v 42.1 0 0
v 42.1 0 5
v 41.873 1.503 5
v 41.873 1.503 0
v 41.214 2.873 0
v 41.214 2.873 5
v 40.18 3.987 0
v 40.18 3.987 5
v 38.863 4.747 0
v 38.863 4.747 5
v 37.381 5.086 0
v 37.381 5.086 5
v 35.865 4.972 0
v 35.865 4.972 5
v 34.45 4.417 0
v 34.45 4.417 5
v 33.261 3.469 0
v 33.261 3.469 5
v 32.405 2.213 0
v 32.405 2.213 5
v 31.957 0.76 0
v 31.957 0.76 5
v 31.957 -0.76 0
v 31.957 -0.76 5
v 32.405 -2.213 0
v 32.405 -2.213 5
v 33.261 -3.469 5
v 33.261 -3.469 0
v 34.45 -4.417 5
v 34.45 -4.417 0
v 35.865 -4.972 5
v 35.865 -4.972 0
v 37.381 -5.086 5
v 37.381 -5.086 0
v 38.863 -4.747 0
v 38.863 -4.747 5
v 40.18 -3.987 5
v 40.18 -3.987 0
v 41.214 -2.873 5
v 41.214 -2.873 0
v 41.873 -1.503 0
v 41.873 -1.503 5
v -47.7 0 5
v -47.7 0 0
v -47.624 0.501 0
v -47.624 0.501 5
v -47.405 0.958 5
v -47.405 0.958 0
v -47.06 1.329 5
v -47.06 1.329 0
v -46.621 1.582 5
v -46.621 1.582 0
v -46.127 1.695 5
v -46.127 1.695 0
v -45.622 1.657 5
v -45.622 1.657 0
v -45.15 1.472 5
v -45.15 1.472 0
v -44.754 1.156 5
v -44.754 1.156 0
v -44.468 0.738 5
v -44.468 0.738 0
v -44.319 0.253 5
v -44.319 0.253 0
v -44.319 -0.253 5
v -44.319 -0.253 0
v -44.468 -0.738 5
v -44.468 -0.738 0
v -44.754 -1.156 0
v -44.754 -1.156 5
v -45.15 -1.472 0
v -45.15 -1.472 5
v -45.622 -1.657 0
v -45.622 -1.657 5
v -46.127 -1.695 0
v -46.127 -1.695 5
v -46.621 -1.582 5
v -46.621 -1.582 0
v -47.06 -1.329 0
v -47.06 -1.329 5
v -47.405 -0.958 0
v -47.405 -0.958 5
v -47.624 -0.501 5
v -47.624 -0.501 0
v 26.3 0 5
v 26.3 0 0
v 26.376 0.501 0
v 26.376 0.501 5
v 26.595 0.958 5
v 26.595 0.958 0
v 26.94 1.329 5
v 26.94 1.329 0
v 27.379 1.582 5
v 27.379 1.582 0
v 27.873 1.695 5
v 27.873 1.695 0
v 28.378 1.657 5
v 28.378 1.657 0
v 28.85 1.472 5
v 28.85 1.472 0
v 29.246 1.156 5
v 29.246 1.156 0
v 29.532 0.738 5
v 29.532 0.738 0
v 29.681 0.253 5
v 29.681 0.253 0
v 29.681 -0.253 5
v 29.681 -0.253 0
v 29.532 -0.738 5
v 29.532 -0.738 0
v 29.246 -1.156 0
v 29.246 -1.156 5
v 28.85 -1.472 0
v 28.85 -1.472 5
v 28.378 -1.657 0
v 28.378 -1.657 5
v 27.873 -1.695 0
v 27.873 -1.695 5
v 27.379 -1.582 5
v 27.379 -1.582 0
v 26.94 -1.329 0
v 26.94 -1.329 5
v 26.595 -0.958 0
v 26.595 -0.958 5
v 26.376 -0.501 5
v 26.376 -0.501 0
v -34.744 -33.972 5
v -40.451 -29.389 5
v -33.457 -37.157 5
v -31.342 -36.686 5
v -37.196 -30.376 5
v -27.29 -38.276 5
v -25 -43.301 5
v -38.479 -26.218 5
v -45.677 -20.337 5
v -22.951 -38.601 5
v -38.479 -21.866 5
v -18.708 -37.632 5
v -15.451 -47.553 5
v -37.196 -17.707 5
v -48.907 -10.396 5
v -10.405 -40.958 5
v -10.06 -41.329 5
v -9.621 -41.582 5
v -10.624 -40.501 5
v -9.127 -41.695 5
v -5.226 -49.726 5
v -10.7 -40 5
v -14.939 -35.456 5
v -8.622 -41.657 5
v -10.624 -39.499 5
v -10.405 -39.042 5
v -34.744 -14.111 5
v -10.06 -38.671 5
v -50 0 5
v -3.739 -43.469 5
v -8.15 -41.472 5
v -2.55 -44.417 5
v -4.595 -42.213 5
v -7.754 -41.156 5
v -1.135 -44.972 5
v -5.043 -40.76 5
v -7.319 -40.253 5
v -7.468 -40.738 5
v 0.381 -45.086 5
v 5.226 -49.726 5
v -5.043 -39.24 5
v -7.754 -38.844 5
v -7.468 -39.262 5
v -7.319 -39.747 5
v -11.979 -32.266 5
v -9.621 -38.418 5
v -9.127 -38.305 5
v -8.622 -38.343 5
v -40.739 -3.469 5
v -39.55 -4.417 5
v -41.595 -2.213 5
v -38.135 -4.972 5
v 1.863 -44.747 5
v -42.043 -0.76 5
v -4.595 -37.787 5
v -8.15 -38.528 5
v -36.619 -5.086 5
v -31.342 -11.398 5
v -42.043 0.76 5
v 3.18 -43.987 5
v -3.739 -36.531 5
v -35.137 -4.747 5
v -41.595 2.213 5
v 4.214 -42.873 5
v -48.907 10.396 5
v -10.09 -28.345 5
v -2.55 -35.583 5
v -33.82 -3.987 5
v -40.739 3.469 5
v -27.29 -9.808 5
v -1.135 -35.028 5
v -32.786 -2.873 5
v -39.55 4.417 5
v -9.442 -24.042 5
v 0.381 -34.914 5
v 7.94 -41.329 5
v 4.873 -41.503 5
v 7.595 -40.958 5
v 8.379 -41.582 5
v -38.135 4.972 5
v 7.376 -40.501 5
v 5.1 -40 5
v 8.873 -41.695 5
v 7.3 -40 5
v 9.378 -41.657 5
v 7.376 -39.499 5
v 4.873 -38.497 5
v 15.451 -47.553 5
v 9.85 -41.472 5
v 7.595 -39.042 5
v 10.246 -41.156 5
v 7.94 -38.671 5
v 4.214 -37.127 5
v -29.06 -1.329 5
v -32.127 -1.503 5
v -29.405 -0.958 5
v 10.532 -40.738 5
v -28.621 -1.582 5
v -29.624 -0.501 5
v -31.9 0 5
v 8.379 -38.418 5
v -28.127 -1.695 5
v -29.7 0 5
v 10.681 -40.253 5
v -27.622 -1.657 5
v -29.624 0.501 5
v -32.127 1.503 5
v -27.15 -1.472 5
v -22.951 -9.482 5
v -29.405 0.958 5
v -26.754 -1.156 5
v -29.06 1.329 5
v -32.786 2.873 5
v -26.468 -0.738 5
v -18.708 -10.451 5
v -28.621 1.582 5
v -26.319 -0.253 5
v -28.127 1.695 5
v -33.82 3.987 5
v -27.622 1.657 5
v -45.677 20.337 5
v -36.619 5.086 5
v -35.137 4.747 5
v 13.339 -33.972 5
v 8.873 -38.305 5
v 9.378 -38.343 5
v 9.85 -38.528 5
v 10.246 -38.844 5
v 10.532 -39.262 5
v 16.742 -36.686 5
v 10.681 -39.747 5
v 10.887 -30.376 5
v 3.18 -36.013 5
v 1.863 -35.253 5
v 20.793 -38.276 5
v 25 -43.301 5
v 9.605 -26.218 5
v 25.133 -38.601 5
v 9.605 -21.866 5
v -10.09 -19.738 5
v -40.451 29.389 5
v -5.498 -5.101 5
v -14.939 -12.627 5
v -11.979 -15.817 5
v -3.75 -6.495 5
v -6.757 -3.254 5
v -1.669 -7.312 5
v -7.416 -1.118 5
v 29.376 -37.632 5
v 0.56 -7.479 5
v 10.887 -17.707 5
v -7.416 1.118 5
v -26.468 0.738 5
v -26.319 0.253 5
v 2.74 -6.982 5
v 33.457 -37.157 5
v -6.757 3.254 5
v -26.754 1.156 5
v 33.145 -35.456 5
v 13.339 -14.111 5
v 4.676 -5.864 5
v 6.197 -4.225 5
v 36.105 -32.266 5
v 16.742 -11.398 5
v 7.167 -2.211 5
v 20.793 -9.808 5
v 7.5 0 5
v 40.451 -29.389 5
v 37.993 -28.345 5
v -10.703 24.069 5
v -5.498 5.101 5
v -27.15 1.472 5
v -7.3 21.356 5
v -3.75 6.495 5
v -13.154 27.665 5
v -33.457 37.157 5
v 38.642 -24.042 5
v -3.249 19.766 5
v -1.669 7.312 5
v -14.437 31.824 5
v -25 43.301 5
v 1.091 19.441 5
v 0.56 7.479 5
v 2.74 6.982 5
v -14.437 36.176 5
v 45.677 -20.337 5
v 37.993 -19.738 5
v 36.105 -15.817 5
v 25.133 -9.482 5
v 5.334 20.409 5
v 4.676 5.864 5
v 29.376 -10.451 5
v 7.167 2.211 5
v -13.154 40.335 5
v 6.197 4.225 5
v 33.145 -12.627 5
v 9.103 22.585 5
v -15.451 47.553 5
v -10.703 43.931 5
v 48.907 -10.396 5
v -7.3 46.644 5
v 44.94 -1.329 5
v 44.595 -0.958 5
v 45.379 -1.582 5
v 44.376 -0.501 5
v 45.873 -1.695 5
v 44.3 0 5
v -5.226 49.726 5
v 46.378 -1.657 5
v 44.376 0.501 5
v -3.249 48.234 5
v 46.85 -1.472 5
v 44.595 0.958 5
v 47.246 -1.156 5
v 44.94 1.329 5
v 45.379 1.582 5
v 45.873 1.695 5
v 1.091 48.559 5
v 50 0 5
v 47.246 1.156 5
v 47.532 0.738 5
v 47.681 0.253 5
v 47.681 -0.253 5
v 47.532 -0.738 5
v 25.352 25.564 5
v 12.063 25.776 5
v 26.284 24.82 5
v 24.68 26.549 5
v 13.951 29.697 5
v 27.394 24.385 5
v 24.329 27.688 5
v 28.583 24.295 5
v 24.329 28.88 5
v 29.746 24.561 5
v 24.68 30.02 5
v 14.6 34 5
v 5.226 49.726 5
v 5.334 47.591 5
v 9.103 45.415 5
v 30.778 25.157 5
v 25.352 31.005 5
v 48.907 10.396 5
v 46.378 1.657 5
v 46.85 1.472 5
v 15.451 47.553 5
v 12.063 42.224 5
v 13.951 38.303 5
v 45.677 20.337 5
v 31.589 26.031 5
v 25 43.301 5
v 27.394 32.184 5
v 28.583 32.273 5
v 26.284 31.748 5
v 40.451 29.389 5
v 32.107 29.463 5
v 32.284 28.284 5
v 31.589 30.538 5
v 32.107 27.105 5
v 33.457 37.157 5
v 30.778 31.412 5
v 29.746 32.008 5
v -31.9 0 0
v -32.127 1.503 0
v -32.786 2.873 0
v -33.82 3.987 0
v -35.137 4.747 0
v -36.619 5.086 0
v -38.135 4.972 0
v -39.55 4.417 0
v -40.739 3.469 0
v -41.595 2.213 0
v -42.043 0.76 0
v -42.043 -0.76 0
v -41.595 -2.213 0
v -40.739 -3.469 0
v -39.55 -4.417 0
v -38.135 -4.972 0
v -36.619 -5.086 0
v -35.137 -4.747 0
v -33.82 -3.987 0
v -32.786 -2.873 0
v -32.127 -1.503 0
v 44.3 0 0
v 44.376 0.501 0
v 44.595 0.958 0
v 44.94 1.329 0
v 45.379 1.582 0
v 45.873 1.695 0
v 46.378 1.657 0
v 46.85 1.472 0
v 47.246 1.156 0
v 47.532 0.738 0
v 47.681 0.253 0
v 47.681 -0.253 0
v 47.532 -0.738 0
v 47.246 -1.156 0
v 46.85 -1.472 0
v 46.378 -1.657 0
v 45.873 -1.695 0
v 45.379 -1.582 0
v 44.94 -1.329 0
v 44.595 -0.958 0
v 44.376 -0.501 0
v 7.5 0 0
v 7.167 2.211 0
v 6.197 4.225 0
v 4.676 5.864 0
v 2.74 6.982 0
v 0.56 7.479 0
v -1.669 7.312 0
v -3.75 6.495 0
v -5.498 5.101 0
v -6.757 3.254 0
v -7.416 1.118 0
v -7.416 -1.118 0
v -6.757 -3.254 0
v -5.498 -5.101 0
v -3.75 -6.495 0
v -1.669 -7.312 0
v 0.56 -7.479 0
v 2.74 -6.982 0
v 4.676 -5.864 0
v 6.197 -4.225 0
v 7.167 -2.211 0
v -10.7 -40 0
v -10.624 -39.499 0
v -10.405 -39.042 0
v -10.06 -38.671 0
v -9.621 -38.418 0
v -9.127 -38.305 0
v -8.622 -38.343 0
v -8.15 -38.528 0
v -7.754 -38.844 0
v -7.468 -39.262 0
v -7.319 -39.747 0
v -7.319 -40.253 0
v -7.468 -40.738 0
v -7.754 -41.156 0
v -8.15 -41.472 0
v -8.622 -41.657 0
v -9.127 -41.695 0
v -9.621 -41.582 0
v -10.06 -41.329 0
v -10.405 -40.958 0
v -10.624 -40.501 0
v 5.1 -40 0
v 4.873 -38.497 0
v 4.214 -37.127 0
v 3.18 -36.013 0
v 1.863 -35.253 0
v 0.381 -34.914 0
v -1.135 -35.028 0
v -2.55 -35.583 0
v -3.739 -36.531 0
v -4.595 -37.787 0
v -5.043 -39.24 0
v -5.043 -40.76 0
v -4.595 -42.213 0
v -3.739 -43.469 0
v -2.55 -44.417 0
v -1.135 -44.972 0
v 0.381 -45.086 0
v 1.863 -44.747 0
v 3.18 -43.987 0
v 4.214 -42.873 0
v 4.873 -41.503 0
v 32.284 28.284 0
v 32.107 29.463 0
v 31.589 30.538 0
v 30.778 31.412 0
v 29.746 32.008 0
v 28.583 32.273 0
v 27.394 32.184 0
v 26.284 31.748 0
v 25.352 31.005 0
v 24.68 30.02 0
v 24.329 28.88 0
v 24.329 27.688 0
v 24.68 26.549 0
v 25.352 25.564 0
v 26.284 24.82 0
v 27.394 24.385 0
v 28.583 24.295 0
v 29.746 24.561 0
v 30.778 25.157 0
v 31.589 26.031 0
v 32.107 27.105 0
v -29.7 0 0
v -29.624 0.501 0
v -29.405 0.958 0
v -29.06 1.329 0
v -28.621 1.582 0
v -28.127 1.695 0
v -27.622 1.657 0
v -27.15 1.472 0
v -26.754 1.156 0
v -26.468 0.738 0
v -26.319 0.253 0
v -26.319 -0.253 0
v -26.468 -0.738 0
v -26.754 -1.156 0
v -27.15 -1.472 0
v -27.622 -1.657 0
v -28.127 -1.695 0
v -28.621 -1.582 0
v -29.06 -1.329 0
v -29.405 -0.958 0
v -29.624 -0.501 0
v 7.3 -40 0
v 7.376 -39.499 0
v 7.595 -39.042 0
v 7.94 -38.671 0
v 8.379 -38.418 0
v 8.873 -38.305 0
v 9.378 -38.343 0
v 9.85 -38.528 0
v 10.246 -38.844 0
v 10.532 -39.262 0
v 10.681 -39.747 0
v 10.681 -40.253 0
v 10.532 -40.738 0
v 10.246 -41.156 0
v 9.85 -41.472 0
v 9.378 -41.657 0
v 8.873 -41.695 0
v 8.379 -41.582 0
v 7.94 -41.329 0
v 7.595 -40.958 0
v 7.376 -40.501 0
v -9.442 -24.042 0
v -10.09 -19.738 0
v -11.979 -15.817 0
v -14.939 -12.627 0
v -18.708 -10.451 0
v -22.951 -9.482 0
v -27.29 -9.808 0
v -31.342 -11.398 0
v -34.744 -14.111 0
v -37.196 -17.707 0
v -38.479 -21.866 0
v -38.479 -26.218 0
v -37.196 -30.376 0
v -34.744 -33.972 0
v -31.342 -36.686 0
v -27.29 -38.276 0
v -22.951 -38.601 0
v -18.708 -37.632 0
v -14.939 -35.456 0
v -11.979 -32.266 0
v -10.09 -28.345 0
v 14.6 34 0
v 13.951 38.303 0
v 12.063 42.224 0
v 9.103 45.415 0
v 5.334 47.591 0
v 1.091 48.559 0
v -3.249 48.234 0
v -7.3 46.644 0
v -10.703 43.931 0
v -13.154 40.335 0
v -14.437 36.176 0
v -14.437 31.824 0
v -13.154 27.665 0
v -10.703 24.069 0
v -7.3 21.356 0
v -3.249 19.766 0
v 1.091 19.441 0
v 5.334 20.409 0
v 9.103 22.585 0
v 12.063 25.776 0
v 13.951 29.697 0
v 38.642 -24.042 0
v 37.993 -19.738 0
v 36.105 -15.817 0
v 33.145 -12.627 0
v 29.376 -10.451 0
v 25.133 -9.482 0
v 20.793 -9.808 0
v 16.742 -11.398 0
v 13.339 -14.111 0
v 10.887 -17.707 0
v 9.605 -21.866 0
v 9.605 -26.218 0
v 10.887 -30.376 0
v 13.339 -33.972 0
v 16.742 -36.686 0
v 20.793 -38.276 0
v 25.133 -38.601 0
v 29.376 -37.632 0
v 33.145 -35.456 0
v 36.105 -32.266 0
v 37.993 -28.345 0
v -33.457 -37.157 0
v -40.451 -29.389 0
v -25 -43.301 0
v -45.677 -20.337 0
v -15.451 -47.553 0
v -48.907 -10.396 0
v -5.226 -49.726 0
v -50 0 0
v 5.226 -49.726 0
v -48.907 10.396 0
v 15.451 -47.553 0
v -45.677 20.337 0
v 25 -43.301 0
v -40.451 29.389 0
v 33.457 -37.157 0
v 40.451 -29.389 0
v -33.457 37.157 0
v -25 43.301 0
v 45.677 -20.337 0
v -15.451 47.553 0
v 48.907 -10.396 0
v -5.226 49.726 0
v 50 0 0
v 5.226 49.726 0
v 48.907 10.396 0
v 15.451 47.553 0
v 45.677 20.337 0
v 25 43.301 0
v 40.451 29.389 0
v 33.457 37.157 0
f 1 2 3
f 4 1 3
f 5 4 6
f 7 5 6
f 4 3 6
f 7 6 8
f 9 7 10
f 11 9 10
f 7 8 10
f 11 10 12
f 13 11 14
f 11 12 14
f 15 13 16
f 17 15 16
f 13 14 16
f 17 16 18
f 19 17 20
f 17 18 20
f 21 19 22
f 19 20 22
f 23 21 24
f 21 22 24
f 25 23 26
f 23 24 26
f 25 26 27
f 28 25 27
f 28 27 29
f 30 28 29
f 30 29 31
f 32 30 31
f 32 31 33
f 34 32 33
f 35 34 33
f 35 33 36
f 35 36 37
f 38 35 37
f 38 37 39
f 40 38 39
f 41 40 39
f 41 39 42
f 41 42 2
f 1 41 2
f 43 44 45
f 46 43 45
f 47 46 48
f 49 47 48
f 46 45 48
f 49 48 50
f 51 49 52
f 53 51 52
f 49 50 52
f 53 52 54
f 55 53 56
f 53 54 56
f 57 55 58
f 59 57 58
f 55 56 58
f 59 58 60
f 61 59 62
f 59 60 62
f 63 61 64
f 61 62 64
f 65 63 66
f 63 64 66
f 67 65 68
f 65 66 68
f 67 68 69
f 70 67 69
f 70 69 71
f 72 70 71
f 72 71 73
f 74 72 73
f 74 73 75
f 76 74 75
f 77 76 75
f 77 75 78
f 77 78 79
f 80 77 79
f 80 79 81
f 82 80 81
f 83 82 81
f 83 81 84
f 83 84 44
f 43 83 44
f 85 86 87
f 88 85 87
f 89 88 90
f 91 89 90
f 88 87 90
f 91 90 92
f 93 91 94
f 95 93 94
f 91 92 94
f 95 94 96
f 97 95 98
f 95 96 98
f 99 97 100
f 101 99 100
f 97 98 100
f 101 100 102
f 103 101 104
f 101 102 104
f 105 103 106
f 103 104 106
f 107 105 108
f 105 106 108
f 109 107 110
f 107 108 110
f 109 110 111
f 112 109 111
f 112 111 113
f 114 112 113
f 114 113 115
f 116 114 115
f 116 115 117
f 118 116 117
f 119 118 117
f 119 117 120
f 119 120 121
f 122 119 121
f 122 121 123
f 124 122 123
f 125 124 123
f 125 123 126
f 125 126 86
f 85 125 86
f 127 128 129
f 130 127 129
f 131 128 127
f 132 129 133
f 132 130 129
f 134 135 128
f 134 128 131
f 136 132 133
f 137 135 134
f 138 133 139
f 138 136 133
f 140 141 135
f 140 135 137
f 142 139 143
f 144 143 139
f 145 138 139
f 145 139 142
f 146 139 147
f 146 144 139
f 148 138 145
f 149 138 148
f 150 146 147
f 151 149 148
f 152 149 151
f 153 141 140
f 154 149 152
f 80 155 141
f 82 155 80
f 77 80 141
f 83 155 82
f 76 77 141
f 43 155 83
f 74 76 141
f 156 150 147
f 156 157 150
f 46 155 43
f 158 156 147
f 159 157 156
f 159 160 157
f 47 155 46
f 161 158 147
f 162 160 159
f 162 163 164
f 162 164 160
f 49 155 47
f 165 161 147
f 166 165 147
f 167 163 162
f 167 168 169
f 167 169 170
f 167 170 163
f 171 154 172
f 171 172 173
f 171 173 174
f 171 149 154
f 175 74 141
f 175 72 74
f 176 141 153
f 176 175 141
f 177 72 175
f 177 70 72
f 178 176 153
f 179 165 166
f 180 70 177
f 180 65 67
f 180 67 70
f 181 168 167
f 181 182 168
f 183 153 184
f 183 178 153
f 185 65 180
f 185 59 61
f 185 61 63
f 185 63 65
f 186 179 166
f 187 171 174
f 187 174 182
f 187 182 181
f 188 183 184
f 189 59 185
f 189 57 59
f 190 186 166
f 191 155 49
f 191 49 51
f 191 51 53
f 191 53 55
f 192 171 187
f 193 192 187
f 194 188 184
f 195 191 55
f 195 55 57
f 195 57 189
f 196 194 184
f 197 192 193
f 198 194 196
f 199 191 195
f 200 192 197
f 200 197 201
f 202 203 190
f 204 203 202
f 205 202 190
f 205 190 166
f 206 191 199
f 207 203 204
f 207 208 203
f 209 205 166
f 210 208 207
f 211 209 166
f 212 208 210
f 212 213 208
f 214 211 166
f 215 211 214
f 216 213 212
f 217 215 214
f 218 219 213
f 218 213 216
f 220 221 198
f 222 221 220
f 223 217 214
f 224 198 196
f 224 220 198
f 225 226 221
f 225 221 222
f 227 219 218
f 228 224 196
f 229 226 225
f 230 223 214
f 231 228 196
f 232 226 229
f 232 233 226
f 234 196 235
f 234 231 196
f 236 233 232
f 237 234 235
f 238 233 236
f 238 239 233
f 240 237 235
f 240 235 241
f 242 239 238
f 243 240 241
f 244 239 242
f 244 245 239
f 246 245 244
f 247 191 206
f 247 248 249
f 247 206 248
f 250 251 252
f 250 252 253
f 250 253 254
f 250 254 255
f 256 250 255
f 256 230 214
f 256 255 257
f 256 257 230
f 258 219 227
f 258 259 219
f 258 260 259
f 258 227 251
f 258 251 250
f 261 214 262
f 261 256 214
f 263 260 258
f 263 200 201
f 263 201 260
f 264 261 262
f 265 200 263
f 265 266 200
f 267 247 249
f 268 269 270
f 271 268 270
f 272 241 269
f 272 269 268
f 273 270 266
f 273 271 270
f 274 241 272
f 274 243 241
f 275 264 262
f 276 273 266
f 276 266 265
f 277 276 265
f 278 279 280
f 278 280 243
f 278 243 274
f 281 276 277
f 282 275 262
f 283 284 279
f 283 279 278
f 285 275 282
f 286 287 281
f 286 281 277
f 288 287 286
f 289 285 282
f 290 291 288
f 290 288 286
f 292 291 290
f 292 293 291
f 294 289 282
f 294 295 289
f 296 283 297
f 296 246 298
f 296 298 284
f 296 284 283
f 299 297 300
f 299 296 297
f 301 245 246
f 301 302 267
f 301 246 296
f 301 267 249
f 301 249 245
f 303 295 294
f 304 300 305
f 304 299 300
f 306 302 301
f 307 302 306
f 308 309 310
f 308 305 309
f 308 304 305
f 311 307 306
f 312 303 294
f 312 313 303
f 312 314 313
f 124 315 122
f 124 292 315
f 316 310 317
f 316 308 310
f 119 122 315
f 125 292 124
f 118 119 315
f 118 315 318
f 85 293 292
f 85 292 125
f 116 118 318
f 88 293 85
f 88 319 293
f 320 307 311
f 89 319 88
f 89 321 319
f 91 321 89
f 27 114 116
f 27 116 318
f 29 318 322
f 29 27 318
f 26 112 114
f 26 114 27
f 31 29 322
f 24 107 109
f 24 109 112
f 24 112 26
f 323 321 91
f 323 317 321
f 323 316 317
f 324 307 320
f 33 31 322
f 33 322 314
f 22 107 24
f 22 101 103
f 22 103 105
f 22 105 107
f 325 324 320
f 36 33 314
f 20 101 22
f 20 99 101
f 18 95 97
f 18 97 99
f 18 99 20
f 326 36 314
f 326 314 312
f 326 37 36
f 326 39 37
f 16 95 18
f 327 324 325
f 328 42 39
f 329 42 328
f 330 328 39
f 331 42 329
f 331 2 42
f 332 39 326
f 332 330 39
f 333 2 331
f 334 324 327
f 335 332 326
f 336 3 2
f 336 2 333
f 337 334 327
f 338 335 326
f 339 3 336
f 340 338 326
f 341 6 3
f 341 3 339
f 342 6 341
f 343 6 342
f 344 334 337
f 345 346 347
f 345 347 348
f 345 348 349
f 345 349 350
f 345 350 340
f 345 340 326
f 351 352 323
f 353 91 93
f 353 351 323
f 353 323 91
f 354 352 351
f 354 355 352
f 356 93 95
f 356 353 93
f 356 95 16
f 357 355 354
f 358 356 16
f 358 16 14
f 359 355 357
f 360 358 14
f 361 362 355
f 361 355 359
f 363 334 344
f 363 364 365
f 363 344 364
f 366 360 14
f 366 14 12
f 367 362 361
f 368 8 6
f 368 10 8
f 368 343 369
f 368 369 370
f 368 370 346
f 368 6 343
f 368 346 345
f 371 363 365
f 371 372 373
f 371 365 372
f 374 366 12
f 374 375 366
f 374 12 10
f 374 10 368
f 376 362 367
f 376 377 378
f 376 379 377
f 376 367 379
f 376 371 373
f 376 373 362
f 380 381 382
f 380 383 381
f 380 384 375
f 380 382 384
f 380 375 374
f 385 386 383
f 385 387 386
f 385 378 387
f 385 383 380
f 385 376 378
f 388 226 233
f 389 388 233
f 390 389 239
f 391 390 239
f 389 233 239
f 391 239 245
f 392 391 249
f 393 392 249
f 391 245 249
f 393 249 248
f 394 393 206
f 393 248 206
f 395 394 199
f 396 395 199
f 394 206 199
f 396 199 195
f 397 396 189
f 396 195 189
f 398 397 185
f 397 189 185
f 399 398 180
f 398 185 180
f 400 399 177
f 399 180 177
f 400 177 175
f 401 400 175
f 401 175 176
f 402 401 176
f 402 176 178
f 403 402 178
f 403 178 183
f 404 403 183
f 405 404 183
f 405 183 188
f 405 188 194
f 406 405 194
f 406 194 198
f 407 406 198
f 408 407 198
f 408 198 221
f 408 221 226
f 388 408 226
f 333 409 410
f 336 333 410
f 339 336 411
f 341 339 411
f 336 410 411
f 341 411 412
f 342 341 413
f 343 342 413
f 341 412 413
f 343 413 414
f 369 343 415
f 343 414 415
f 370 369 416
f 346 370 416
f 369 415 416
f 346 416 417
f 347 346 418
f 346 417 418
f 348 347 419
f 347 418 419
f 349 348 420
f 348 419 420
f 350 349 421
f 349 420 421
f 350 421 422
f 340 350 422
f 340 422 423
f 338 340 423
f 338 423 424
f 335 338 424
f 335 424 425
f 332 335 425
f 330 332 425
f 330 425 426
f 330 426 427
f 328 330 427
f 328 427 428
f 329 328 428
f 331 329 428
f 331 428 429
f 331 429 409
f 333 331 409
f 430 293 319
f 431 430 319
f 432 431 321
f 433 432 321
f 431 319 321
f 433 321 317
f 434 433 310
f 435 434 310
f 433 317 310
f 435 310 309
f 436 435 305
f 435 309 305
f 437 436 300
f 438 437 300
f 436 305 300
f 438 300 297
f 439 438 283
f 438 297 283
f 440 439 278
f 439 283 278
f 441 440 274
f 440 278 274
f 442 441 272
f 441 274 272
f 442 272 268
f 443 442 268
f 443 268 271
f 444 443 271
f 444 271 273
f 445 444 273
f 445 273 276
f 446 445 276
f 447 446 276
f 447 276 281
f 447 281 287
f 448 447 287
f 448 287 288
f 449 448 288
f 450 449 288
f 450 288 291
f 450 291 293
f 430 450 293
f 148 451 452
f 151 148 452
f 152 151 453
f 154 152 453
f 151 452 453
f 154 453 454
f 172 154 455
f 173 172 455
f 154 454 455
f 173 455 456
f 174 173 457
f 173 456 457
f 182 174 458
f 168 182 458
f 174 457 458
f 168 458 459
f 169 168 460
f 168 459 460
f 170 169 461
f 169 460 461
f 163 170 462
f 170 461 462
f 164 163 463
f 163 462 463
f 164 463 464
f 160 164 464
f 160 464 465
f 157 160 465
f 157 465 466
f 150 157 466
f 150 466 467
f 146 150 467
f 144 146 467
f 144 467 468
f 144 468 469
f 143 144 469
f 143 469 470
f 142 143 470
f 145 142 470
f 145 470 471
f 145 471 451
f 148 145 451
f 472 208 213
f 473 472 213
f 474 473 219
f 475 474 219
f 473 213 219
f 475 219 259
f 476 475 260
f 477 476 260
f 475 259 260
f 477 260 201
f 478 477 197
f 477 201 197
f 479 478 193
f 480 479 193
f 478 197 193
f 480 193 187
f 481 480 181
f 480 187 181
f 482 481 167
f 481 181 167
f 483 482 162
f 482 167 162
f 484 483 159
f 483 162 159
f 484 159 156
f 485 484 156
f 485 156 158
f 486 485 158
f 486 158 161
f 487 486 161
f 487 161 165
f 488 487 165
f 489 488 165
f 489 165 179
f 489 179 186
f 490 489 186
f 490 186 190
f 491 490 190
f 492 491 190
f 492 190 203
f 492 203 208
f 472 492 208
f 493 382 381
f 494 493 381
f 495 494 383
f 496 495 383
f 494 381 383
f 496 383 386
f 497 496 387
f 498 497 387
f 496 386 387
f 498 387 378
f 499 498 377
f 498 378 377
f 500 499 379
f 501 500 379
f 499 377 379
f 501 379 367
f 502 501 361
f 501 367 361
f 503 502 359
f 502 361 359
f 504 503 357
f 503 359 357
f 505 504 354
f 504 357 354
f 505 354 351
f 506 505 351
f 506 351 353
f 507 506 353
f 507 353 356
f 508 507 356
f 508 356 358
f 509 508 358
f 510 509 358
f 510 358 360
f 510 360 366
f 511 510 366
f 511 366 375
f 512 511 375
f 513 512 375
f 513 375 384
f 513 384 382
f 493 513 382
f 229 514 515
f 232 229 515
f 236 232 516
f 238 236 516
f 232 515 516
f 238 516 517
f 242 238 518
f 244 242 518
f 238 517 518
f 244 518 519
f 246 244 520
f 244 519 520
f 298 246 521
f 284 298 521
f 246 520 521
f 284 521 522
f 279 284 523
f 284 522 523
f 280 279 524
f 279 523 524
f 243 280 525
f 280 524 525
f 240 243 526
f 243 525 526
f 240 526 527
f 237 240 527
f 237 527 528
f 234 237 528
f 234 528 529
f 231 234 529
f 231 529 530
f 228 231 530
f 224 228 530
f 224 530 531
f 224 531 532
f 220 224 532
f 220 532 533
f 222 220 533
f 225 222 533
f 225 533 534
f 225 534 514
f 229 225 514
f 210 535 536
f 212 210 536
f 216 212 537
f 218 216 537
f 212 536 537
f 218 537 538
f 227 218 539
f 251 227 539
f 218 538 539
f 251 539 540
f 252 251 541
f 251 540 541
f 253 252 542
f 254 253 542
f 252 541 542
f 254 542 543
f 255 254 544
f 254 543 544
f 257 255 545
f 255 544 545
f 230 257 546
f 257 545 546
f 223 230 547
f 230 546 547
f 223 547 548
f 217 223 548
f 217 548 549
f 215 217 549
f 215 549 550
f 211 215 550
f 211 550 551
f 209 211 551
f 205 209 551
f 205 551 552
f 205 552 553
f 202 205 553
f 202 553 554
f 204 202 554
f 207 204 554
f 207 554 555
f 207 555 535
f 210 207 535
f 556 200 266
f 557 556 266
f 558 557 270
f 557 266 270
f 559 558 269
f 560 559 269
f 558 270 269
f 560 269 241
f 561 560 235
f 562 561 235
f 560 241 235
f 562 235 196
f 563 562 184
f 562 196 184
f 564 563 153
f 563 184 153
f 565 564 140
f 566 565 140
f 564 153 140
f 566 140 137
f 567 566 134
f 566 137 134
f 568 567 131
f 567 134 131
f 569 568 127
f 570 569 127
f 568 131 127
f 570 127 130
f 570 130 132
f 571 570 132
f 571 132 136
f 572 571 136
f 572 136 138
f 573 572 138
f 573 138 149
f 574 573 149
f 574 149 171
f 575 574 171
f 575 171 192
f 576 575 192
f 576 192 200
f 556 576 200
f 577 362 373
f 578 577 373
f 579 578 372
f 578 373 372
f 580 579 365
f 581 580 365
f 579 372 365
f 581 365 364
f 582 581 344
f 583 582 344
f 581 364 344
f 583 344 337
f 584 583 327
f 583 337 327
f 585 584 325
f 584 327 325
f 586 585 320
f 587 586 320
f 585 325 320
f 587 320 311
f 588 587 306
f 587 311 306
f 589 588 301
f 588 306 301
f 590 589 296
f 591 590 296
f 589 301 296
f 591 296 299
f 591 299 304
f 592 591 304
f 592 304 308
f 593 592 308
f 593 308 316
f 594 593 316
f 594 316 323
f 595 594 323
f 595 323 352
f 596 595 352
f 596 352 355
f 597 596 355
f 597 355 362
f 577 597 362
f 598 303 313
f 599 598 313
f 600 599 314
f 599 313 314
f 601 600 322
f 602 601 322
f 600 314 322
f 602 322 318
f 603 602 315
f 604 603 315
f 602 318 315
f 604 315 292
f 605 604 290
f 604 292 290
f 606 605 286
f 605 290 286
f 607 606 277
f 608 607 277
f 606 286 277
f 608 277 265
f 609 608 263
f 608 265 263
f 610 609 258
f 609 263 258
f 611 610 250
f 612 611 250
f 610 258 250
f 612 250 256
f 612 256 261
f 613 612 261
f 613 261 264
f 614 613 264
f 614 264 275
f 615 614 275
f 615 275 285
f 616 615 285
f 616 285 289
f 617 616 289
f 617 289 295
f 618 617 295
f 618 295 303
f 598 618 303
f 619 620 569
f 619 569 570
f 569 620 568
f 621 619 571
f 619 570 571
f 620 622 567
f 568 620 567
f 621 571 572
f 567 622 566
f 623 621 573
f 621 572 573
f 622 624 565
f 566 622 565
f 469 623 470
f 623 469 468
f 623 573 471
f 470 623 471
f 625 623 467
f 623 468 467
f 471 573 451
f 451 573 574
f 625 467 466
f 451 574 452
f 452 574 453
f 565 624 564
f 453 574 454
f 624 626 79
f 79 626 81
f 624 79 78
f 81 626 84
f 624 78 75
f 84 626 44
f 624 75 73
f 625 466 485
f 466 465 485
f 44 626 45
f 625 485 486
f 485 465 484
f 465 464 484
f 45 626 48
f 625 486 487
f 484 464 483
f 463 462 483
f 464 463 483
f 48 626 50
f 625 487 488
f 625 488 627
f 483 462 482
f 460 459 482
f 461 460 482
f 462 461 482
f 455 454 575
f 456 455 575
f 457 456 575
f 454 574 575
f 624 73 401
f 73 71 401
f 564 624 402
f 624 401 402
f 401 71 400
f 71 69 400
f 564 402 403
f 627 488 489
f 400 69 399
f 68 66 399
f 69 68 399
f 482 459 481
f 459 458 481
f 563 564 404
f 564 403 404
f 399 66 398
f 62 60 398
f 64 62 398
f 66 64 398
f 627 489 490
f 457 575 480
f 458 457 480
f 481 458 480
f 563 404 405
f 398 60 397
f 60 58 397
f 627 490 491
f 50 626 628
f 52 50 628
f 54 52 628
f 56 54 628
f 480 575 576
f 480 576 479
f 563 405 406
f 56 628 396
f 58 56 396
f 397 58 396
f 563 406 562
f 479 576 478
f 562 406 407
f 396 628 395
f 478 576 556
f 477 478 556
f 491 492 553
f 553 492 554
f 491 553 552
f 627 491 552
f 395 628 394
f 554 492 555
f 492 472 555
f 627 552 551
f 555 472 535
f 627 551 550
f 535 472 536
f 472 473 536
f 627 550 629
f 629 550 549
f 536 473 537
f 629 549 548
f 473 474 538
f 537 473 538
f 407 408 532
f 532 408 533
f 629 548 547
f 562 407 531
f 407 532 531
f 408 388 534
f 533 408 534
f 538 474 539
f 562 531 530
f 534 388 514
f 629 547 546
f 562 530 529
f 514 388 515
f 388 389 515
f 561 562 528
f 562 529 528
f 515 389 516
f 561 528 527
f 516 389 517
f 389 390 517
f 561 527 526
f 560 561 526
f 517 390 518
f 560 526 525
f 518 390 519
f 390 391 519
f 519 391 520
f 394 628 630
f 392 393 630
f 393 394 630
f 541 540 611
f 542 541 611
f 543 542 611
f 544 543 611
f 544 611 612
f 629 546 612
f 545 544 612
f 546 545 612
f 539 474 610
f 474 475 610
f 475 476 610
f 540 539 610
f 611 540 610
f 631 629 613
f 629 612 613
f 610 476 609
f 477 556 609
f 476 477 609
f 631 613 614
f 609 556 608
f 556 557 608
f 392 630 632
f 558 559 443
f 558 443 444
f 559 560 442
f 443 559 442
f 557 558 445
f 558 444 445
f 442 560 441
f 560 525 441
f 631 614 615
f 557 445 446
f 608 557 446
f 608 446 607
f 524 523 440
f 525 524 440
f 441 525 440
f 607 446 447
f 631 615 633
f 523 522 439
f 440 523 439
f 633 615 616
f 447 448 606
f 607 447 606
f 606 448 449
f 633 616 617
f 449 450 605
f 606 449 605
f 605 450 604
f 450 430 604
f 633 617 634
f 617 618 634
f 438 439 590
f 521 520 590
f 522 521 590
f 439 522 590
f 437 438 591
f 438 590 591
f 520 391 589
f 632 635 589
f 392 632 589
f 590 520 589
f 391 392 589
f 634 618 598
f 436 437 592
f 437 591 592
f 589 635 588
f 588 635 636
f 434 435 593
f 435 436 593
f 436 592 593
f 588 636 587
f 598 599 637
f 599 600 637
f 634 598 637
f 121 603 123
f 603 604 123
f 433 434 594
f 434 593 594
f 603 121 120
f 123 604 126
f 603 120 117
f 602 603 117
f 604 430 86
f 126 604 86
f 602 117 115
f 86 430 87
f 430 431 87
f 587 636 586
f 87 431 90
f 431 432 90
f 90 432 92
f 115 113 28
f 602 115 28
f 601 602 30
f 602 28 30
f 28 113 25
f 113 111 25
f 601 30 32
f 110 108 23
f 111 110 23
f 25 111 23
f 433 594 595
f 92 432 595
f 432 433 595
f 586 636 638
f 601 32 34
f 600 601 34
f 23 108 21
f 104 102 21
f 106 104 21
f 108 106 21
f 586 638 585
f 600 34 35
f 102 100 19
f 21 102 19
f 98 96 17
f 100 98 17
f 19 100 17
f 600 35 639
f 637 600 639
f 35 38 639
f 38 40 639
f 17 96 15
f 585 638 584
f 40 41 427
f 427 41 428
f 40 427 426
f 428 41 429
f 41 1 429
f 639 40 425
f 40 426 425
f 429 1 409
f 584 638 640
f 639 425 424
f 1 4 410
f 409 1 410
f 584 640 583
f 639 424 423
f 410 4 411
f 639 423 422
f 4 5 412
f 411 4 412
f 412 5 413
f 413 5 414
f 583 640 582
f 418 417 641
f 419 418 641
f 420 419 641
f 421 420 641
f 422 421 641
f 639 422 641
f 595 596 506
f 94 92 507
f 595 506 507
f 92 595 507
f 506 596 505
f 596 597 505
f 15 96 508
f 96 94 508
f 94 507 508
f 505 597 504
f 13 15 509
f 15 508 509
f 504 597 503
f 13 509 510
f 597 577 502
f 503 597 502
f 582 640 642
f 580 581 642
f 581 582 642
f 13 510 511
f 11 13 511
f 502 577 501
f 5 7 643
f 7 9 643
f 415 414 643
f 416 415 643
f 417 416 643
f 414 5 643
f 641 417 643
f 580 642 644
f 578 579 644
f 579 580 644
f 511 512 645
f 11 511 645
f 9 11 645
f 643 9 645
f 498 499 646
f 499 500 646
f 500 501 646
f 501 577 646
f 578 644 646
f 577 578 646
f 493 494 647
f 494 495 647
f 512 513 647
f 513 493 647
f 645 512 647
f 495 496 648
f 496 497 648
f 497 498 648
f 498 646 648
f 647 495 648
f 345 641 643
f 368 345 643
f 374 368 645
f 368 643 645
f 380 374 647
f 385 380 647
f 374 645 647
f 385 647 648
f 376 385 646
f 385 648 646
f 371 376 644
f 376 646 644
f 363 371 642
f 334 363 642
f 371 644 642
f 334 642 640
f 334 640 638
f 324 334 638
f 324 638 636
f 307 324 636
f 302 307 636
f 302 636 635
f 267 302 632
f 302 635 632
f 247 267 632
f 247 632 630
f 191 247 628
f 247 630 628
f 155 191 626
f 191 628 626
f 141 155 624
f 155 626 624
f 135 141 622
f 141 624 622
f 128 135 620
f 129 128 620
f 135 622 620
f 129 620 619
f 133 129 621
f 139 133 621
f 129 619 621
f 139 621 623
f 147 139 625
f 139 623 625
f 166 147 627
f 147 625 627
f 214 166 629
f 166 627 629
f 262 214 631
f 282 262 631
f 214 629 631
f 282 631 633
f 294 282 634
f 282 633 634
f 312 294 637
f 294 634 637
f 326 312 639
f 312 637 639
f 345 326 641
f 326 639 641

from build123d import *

# Parameters (mm, degrees)
SKETCH1_R                    = 50
BOSS_EXTRUDE1_DEPTH          = 5
F_15_0_15_DIAMETER_HOLE1_D   = 15
F_10_2_10_2_DIAMETER_HOLE1_D = 10.2
M3_CLEARANCE_HOLE1_D         = 3.4
SKETCH9_R                    = 14.6
CUT_EXTRUDE1_DEPTH           = 10
SKETCH10_R                   = 4
CUT_EXTRUDE2_DEPTH           = 10


with BuildPart() as part:
    # Sketch1 → Boss-Extrude1 (new body)
    with BuildSketch(Plane.XY):
        Circle(SKETCH1_R)
    extrude(amount=BOSS_EXTRUDE1_DEPTH)

    # Ø15.0 (15) Diameter Hole1 (through all)
    with Locations(Plane(origin=(0, 0, 0), x_dir=(-1, 0, 0), z_dir=(0, 0, -1))):
        with Locations((0, 0)):
            Hole(F_15_0_15_DIAMETER_HOLE1_D / 2)

    # Ø10.2 (10.2) Diameter Hole1 (through all)
    with Locations(Plane(origin=(0, 0, 0), x_dir=(-1, 0, 0), z_dir=(0, 0, -1))):
        with Locations((37, 0), (-37, 0), (0, -40)):
            Hole(F_10_2_10_2_DIAMETER_HOLE1_D / 2)

    # M3 Clearance Hole1 (through all)
    with Locations(Plane.XY.offset(5)):
        with Locations((46, 0), (28, 0), (9, -40), (-9, -40), (-46, 0), (-28, 0)):
            Hole(M3_CLEARANCE_HOLE1_D / 2)

    # Sketch9 → Cut-Extrude1 (cut)
    with BuildSketch(Plane.XY.offset(5)):
        with Locations((24.04163056, -24.04163056)):
            Circle(SKETCH9_R)
        with Locations((-24.04163056, -24.04163056)):
            Circle(SKETCH9_R)
        with Locations((0, 34)):
            Circle(SKETCH9_R)
    extrude(amount=-CUT_EXTRUDE1_DEPTH, mode=Mode.SUBTRACT)

    # Sketch10 → Cut-Extrude2 (cut)
    with BuildSketch(Plane.XY.offset(5)):
        with Locations((28.284271247, 28.284271247)):
            Circle(SKETCH10_R)
    extrude(amount=-CUT_EXTRUDE2_DEPTH, mode=Mode.SUBTRACT)


solid = part.part
